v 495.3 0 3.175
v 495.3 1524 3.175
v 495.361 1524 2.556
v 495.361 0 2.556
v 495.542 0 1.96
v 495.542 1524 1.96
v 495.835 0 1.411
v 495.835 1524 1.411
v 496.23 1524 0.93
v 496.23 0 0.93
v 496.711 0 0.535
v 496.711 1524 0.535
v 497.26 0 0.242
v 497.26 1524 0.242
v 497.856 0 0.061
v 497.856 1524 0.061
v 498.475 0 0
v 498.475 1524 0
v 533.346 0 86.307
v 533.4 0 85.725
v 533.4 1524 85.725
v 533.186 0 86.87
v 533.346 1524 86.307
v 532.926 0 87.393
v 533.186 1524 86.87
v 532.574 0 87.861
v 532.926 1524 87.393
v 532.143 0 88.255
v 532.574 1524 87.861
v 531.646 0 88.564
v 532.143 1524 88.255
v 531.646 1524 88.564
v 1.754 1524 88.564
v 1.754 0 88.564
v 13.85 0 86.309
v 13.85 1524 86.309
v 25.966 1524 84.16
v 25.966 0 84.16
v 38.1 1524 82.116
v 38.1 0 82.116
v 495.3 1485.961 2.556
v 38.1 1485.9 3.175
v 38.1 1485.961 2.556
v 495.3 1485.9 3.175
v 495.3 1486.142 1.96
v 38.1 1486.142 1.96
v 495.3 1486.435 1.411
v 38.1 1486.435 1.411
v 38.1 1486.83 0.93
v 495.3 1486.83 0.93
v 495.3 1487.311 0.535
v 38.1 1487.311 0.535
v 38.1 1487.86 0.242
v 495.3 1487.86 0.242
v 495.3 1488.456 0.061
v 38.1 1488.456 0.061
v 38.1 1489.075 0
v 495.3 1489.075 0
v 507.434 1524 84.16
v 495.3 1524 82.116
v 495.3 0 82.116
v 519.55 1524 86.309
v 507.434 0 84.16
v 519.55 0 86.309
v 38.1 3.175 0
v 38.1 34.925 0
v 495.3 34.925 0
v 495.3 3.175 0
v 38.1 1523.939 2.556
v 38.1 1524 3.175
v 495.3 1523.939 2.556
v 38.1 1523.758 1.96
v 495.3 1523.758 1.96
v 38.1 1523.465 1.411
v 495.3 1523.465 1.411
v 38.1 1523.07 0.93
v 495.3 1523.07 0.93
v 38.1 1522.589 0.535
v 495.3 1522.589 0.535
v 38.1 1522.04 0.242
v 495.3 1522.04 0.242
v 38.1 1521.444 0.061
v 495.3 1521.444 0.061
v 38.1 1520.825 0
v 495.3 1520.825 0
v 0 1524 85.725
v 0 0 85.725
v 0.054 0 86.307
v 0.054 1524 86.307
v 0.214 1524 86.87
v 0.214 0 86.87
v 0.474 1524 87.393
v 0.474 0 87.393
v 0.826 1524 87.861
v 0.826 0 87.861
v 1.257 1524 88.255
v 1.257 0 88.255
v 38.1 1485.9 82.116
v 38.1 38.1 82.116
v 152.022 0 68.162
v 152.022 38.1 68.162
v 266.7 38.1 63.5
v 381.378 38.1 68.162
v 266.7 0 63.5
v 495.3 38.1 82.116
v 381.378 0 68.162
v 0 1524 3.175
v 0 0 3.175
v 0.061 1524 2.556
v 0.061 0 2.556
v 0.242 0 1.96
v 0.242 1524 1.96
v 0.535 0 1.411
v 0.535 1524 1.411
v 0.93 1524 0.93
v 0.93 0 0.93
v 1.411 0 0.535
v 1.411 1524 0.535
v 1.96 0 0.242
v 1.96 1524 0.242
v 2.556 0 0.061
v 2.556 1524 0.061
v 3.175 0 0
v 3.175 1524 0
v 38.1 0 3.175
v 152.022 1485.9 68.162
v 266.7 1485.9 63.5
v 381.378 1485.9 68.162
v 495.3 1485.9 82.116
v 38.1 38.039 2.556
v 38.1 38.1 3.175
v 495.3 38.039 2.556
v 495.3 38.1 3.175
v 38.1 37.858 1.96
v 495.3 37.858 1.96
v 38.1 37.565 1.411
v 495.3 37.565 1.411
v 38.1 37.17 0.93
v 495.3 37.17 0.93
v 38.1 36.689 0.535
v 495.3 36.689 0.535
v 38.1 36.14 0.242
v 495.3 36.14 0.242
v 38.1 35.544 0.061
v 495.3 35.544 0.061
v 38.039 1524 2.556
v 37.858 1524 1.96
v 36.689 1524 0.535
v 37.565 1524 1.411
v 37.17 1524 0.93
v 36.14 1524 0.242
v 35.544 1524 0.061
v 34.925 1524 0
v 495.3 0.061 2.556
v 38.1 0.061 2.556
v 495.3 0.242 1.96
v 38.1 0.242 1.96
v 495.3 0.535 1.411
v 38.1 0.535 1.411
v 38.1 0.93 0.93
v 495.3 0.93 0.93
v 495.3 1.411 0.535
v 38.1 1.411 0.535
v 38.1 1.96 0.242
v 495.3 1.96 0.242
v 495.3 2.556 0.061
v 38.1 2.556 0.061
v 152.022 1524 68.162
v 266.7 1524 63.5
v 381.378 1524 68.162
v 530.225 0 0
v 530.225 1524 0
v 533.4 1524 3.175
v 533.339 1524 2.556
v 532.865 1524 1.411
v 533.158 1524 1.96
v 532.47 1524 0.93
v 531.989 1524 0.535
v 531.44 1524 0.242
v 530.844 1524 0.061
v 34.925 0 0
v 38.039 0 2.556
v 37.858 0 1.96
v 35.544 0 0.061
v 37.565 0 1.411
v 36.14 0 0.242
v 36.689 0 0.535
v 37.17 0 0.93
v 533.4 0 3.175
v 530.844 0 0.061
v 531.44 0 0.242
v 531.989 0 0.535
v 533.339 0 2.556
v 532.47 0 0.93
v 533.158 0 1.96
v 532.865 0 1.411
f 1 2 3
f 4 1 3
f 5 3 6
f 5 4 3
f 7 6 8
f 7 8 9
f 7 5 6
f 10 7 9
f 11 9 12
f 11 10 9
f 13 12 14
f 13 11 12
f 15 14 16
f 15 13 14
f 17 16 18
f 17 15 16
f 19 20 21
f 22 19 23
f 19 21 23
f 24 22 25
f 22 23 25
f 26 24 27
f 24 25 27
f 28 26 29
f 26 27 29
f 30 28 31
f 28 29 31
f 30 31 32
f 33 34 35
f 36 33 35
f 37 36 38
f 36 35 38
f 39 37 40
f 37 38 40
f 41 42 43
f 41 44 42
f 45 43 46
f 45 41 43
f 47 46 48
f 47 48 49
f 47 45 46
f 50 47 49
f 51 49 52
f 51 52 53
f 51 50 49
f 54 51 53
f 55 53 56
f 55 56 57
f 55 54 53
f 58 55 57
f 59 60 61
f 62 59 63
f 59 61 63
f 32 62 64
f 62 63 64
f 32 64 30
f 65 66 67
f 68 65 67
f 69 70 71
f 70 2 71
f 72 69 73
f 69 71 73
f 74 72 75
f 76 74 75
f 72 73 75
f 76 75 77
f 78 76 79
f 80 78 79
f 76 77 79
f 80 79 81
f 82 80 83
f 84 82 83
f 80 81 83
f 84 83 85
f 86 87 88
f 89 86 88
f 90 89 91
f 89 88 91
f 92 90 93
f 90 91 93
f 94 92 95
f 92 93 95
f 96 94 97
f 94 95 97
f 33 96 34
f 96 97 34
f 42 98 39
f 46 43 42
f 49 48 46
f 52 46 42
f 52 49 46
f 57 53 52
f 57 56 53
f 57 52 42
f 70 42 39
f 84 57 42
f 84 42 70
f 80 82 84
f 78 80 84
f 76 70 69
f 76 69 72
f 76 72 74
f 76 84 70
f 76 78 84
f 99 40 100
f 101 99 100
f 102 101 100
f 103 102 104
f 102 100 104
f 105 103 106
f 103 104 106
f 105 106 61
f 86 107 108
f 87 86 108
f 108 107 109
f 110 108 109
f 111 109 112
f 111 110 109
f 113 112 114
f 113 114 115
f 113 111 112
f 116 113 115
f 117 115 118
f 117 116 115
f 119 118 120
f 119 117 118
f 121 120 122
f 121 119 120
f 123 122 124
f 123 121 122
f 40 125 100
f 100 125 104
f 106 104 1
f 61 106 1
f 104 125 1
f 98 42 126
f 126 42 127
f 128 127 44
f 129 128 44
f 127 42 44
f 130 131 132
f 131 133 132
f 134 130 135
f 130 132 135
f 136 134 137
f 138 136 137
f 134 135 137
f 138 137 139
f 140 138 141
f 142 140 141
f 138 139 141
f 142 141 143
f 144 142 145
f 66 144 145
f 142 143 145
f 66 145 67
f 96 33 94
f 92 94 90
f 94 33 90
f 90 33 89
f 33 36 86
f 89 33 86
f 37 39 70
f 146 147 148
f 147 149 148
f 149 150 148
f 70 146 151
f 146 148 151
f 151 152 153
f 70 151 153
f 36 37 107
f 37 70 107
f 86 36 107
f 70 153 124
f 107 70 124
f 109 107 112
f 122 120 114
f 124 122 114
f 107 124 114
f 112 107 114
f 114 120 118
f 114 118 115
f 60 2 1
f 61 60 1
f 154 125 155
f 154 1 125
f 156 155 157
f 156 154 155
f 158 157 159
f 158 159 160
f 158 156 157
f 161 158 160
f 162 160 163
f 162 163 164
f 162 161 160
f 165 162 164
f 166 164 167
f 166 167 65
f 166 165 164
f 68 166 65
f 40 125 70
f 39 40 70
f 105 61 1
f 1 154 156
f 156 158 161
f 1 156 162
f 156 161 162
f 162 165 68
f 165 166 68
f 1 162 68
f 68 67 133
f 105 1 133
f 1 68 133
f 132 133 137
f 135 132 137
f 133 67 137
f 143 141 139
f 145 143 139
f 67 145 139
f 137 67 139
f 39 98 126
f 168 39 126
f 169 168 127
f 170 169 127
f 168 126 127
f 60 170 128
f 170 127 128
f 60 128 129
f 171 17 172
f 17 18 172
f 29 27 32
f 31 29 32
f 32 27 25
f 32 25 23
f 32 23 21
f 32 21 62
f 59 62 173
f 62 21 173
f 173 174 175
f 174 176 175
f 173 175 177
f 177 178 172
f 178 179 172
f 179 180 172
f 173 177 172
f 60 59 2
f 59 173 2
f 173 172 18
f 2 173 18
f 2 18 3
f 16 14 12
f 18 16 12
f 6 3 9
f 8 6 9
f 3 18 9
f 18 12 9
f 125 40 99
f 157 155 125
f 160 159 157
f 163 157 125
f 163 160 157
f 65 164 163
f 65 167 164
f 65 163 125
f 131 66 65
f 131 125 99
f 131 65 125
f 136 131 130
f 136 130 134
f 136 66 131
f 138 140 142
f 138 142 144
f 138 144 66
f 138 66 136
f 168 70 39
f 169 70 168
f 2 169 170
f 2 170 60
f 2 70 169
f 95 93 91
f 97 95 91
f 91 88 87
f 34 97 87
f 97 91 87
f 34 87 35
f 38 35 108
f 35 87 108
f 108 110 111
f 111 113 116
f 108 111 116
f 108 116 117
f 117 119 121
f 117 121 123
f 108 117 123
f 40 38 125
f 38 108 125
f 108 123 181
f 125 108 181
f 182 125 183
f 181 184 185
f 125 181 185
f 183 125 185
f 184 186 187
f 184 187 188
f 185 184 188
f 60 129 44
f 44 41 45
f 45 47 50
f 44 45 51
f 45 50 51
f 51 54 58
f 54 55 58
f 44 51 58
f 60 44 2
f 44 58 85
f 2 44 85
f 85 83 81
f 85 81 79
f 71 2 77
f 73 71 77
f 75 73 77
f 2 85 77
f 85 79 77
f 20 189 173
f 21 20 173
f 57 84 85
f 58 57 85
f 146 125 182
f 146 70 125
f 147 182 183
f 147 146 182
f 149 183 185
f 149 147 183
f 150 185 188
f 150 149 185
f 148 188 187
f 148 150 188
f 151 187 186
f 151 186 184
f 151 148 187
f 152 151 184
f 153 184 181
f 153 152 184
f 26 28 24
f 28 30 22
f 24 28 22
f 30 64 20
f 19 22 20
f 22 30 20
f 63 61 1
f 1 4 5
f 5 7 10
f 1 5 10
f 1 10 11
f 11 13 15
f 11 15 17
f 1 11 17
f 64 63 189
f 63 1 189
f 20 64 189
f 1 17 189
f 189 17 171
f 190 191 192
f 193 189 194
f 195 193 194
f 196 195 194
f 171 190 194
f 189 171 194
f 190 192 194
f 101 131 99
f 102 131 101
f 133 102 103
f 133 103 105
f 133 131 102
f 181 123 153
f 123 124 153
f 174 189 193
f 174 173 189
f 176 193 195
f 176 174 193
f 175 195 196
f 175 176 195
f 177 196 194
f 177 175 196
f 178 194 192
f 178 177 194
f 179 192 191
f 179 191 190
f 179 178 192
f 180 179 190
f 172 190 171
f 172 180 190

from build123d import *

# Parameters (mm, degrees)
F2_DEPTH = 88.9
F1_W     = 457.2
F1_H     = 38.1
F3_DEPTH = 88.9
F4_R     = 3.175
F4_2_R   = 3.175
F4_3_R   = 3.175
F4_4_R   = 3.175
F5_R     = 1412.875
F6_DEPTH = 1524.001


with BuildPart() as f2:
    # F1 (on Top) → F2 (new body)
    with BuildSketch(Plane.XY):
        Polygon((0, 1524), (0, 0), (38.1, 0), (38.1, 38.1), (38.1, 1485.9), (38.1, 1524), align=None)
    extrude(amount=F2_DEPTH)

    # F4#3
    f4_3_edges = [f2.edges().sort_by_distance(p)[0] for p in [
        (38.1, 762, 88.9),
        (38.1, 762, 0),
        (0, 762, 88.9),
        (0, 762, 0),
    ]]
    fillet(f4_3_edges, radius=F4_3_R)


with BuildPart() as f2b:
    # F1 (on Top) → F2, piece 2 (new body)
    with BuildSketch(Plane.XY):
        Polygon((495.3, 38.1), (495.3, 0), (533.4, 0), (533.4, 1524), (495.3, 1524), (495.3, 1485.9), align=None)
    extrude(amount=F2_DEPTH)

    # F4#2
    f4_2_edges = [f2b.edges().sort_by_distance(p)[0] for p in [
        (495.3, 762, 0),
        (533.4, 762, 0),
        (533.4, 762, 88.9),
        (495.3, 762, 88.9),
    ]]
    fillet(f4_2_edges, radius=F4_2_R)


with BuildPart() as f3:
    # F1 (on Top) → F3 (new body)
    with BuildSketch(Plane.XY):
        with Locations((266.7, 19.05)):
            Rectangle(F1_W, F1_H)
    extrude(amount=F3_DEPTH)

    # F4
    f4_edges = [f3.edges().sort_by_distance(p)[0] for p in [
        (266.7, 0, 88.9),
        (266.7, 0, 0),
        (266.7, 38.1, 88.9),
        (266.7, 38.1, 0),
    ]]
    fillet(f4_edges, radius=F4_R)


with BuildPart() as f3b:
    # F1 (on Top) → F3, piece 2 (new body)
    with BuildSketch(Plane.XY):
        with Locations((266.7, 1504.95)):
            Rectangle(F1_W, F1_H)
    extrude(amount=F3_DEPTH)

    # F4#4
    f4_4_edges = [f3b.edges().sort_by_distance(p)[0] for p in [
        (266.7, 1485.9, 0),
        (266.7, 1485.9, 88.9),
        (266.7, 1524, 88.9),
        (266.7, 1524, 0),
    ]]
    fillet(f4_4_edges, radius=F4_4_R)


with BuildPart() as f6_tool:
    # F5 (on Front) → F6 (new body, through all)
    with BuildSketch(Plane.XZ):
        with Locations((266.7, 1476.375)):
            Circle(F5_R)
    extrude(amount=-F6_DEPTH)


with BuildPart() as f2_1:
    add(f2.part)

    # F6: cut by f6_tool
    add(f6_tool.part, mode=Mode.SUBTRACT)


with BuildPart() as f2b_1:
    add(f2b.part)

    # F6: cut by f6_tool
    add(f6_tool.part, mode=Mode.SUBTRACT)


with BuildPart() as f3_1:
    add(f3.part)

    # F6: cut by f6_tool
    add(f6_tool.part, mode=Mode.SUBTRACT)


with BuildPart() as f3b_1:
    add(f3b.part)

    # F6: cut by f6_tool
    add(f6_tool.part, mode=Mode.SUBTRACT)


solid = Compound([f2_1.part, f2b_1.part, f3_1.part, f3b_1.part])
